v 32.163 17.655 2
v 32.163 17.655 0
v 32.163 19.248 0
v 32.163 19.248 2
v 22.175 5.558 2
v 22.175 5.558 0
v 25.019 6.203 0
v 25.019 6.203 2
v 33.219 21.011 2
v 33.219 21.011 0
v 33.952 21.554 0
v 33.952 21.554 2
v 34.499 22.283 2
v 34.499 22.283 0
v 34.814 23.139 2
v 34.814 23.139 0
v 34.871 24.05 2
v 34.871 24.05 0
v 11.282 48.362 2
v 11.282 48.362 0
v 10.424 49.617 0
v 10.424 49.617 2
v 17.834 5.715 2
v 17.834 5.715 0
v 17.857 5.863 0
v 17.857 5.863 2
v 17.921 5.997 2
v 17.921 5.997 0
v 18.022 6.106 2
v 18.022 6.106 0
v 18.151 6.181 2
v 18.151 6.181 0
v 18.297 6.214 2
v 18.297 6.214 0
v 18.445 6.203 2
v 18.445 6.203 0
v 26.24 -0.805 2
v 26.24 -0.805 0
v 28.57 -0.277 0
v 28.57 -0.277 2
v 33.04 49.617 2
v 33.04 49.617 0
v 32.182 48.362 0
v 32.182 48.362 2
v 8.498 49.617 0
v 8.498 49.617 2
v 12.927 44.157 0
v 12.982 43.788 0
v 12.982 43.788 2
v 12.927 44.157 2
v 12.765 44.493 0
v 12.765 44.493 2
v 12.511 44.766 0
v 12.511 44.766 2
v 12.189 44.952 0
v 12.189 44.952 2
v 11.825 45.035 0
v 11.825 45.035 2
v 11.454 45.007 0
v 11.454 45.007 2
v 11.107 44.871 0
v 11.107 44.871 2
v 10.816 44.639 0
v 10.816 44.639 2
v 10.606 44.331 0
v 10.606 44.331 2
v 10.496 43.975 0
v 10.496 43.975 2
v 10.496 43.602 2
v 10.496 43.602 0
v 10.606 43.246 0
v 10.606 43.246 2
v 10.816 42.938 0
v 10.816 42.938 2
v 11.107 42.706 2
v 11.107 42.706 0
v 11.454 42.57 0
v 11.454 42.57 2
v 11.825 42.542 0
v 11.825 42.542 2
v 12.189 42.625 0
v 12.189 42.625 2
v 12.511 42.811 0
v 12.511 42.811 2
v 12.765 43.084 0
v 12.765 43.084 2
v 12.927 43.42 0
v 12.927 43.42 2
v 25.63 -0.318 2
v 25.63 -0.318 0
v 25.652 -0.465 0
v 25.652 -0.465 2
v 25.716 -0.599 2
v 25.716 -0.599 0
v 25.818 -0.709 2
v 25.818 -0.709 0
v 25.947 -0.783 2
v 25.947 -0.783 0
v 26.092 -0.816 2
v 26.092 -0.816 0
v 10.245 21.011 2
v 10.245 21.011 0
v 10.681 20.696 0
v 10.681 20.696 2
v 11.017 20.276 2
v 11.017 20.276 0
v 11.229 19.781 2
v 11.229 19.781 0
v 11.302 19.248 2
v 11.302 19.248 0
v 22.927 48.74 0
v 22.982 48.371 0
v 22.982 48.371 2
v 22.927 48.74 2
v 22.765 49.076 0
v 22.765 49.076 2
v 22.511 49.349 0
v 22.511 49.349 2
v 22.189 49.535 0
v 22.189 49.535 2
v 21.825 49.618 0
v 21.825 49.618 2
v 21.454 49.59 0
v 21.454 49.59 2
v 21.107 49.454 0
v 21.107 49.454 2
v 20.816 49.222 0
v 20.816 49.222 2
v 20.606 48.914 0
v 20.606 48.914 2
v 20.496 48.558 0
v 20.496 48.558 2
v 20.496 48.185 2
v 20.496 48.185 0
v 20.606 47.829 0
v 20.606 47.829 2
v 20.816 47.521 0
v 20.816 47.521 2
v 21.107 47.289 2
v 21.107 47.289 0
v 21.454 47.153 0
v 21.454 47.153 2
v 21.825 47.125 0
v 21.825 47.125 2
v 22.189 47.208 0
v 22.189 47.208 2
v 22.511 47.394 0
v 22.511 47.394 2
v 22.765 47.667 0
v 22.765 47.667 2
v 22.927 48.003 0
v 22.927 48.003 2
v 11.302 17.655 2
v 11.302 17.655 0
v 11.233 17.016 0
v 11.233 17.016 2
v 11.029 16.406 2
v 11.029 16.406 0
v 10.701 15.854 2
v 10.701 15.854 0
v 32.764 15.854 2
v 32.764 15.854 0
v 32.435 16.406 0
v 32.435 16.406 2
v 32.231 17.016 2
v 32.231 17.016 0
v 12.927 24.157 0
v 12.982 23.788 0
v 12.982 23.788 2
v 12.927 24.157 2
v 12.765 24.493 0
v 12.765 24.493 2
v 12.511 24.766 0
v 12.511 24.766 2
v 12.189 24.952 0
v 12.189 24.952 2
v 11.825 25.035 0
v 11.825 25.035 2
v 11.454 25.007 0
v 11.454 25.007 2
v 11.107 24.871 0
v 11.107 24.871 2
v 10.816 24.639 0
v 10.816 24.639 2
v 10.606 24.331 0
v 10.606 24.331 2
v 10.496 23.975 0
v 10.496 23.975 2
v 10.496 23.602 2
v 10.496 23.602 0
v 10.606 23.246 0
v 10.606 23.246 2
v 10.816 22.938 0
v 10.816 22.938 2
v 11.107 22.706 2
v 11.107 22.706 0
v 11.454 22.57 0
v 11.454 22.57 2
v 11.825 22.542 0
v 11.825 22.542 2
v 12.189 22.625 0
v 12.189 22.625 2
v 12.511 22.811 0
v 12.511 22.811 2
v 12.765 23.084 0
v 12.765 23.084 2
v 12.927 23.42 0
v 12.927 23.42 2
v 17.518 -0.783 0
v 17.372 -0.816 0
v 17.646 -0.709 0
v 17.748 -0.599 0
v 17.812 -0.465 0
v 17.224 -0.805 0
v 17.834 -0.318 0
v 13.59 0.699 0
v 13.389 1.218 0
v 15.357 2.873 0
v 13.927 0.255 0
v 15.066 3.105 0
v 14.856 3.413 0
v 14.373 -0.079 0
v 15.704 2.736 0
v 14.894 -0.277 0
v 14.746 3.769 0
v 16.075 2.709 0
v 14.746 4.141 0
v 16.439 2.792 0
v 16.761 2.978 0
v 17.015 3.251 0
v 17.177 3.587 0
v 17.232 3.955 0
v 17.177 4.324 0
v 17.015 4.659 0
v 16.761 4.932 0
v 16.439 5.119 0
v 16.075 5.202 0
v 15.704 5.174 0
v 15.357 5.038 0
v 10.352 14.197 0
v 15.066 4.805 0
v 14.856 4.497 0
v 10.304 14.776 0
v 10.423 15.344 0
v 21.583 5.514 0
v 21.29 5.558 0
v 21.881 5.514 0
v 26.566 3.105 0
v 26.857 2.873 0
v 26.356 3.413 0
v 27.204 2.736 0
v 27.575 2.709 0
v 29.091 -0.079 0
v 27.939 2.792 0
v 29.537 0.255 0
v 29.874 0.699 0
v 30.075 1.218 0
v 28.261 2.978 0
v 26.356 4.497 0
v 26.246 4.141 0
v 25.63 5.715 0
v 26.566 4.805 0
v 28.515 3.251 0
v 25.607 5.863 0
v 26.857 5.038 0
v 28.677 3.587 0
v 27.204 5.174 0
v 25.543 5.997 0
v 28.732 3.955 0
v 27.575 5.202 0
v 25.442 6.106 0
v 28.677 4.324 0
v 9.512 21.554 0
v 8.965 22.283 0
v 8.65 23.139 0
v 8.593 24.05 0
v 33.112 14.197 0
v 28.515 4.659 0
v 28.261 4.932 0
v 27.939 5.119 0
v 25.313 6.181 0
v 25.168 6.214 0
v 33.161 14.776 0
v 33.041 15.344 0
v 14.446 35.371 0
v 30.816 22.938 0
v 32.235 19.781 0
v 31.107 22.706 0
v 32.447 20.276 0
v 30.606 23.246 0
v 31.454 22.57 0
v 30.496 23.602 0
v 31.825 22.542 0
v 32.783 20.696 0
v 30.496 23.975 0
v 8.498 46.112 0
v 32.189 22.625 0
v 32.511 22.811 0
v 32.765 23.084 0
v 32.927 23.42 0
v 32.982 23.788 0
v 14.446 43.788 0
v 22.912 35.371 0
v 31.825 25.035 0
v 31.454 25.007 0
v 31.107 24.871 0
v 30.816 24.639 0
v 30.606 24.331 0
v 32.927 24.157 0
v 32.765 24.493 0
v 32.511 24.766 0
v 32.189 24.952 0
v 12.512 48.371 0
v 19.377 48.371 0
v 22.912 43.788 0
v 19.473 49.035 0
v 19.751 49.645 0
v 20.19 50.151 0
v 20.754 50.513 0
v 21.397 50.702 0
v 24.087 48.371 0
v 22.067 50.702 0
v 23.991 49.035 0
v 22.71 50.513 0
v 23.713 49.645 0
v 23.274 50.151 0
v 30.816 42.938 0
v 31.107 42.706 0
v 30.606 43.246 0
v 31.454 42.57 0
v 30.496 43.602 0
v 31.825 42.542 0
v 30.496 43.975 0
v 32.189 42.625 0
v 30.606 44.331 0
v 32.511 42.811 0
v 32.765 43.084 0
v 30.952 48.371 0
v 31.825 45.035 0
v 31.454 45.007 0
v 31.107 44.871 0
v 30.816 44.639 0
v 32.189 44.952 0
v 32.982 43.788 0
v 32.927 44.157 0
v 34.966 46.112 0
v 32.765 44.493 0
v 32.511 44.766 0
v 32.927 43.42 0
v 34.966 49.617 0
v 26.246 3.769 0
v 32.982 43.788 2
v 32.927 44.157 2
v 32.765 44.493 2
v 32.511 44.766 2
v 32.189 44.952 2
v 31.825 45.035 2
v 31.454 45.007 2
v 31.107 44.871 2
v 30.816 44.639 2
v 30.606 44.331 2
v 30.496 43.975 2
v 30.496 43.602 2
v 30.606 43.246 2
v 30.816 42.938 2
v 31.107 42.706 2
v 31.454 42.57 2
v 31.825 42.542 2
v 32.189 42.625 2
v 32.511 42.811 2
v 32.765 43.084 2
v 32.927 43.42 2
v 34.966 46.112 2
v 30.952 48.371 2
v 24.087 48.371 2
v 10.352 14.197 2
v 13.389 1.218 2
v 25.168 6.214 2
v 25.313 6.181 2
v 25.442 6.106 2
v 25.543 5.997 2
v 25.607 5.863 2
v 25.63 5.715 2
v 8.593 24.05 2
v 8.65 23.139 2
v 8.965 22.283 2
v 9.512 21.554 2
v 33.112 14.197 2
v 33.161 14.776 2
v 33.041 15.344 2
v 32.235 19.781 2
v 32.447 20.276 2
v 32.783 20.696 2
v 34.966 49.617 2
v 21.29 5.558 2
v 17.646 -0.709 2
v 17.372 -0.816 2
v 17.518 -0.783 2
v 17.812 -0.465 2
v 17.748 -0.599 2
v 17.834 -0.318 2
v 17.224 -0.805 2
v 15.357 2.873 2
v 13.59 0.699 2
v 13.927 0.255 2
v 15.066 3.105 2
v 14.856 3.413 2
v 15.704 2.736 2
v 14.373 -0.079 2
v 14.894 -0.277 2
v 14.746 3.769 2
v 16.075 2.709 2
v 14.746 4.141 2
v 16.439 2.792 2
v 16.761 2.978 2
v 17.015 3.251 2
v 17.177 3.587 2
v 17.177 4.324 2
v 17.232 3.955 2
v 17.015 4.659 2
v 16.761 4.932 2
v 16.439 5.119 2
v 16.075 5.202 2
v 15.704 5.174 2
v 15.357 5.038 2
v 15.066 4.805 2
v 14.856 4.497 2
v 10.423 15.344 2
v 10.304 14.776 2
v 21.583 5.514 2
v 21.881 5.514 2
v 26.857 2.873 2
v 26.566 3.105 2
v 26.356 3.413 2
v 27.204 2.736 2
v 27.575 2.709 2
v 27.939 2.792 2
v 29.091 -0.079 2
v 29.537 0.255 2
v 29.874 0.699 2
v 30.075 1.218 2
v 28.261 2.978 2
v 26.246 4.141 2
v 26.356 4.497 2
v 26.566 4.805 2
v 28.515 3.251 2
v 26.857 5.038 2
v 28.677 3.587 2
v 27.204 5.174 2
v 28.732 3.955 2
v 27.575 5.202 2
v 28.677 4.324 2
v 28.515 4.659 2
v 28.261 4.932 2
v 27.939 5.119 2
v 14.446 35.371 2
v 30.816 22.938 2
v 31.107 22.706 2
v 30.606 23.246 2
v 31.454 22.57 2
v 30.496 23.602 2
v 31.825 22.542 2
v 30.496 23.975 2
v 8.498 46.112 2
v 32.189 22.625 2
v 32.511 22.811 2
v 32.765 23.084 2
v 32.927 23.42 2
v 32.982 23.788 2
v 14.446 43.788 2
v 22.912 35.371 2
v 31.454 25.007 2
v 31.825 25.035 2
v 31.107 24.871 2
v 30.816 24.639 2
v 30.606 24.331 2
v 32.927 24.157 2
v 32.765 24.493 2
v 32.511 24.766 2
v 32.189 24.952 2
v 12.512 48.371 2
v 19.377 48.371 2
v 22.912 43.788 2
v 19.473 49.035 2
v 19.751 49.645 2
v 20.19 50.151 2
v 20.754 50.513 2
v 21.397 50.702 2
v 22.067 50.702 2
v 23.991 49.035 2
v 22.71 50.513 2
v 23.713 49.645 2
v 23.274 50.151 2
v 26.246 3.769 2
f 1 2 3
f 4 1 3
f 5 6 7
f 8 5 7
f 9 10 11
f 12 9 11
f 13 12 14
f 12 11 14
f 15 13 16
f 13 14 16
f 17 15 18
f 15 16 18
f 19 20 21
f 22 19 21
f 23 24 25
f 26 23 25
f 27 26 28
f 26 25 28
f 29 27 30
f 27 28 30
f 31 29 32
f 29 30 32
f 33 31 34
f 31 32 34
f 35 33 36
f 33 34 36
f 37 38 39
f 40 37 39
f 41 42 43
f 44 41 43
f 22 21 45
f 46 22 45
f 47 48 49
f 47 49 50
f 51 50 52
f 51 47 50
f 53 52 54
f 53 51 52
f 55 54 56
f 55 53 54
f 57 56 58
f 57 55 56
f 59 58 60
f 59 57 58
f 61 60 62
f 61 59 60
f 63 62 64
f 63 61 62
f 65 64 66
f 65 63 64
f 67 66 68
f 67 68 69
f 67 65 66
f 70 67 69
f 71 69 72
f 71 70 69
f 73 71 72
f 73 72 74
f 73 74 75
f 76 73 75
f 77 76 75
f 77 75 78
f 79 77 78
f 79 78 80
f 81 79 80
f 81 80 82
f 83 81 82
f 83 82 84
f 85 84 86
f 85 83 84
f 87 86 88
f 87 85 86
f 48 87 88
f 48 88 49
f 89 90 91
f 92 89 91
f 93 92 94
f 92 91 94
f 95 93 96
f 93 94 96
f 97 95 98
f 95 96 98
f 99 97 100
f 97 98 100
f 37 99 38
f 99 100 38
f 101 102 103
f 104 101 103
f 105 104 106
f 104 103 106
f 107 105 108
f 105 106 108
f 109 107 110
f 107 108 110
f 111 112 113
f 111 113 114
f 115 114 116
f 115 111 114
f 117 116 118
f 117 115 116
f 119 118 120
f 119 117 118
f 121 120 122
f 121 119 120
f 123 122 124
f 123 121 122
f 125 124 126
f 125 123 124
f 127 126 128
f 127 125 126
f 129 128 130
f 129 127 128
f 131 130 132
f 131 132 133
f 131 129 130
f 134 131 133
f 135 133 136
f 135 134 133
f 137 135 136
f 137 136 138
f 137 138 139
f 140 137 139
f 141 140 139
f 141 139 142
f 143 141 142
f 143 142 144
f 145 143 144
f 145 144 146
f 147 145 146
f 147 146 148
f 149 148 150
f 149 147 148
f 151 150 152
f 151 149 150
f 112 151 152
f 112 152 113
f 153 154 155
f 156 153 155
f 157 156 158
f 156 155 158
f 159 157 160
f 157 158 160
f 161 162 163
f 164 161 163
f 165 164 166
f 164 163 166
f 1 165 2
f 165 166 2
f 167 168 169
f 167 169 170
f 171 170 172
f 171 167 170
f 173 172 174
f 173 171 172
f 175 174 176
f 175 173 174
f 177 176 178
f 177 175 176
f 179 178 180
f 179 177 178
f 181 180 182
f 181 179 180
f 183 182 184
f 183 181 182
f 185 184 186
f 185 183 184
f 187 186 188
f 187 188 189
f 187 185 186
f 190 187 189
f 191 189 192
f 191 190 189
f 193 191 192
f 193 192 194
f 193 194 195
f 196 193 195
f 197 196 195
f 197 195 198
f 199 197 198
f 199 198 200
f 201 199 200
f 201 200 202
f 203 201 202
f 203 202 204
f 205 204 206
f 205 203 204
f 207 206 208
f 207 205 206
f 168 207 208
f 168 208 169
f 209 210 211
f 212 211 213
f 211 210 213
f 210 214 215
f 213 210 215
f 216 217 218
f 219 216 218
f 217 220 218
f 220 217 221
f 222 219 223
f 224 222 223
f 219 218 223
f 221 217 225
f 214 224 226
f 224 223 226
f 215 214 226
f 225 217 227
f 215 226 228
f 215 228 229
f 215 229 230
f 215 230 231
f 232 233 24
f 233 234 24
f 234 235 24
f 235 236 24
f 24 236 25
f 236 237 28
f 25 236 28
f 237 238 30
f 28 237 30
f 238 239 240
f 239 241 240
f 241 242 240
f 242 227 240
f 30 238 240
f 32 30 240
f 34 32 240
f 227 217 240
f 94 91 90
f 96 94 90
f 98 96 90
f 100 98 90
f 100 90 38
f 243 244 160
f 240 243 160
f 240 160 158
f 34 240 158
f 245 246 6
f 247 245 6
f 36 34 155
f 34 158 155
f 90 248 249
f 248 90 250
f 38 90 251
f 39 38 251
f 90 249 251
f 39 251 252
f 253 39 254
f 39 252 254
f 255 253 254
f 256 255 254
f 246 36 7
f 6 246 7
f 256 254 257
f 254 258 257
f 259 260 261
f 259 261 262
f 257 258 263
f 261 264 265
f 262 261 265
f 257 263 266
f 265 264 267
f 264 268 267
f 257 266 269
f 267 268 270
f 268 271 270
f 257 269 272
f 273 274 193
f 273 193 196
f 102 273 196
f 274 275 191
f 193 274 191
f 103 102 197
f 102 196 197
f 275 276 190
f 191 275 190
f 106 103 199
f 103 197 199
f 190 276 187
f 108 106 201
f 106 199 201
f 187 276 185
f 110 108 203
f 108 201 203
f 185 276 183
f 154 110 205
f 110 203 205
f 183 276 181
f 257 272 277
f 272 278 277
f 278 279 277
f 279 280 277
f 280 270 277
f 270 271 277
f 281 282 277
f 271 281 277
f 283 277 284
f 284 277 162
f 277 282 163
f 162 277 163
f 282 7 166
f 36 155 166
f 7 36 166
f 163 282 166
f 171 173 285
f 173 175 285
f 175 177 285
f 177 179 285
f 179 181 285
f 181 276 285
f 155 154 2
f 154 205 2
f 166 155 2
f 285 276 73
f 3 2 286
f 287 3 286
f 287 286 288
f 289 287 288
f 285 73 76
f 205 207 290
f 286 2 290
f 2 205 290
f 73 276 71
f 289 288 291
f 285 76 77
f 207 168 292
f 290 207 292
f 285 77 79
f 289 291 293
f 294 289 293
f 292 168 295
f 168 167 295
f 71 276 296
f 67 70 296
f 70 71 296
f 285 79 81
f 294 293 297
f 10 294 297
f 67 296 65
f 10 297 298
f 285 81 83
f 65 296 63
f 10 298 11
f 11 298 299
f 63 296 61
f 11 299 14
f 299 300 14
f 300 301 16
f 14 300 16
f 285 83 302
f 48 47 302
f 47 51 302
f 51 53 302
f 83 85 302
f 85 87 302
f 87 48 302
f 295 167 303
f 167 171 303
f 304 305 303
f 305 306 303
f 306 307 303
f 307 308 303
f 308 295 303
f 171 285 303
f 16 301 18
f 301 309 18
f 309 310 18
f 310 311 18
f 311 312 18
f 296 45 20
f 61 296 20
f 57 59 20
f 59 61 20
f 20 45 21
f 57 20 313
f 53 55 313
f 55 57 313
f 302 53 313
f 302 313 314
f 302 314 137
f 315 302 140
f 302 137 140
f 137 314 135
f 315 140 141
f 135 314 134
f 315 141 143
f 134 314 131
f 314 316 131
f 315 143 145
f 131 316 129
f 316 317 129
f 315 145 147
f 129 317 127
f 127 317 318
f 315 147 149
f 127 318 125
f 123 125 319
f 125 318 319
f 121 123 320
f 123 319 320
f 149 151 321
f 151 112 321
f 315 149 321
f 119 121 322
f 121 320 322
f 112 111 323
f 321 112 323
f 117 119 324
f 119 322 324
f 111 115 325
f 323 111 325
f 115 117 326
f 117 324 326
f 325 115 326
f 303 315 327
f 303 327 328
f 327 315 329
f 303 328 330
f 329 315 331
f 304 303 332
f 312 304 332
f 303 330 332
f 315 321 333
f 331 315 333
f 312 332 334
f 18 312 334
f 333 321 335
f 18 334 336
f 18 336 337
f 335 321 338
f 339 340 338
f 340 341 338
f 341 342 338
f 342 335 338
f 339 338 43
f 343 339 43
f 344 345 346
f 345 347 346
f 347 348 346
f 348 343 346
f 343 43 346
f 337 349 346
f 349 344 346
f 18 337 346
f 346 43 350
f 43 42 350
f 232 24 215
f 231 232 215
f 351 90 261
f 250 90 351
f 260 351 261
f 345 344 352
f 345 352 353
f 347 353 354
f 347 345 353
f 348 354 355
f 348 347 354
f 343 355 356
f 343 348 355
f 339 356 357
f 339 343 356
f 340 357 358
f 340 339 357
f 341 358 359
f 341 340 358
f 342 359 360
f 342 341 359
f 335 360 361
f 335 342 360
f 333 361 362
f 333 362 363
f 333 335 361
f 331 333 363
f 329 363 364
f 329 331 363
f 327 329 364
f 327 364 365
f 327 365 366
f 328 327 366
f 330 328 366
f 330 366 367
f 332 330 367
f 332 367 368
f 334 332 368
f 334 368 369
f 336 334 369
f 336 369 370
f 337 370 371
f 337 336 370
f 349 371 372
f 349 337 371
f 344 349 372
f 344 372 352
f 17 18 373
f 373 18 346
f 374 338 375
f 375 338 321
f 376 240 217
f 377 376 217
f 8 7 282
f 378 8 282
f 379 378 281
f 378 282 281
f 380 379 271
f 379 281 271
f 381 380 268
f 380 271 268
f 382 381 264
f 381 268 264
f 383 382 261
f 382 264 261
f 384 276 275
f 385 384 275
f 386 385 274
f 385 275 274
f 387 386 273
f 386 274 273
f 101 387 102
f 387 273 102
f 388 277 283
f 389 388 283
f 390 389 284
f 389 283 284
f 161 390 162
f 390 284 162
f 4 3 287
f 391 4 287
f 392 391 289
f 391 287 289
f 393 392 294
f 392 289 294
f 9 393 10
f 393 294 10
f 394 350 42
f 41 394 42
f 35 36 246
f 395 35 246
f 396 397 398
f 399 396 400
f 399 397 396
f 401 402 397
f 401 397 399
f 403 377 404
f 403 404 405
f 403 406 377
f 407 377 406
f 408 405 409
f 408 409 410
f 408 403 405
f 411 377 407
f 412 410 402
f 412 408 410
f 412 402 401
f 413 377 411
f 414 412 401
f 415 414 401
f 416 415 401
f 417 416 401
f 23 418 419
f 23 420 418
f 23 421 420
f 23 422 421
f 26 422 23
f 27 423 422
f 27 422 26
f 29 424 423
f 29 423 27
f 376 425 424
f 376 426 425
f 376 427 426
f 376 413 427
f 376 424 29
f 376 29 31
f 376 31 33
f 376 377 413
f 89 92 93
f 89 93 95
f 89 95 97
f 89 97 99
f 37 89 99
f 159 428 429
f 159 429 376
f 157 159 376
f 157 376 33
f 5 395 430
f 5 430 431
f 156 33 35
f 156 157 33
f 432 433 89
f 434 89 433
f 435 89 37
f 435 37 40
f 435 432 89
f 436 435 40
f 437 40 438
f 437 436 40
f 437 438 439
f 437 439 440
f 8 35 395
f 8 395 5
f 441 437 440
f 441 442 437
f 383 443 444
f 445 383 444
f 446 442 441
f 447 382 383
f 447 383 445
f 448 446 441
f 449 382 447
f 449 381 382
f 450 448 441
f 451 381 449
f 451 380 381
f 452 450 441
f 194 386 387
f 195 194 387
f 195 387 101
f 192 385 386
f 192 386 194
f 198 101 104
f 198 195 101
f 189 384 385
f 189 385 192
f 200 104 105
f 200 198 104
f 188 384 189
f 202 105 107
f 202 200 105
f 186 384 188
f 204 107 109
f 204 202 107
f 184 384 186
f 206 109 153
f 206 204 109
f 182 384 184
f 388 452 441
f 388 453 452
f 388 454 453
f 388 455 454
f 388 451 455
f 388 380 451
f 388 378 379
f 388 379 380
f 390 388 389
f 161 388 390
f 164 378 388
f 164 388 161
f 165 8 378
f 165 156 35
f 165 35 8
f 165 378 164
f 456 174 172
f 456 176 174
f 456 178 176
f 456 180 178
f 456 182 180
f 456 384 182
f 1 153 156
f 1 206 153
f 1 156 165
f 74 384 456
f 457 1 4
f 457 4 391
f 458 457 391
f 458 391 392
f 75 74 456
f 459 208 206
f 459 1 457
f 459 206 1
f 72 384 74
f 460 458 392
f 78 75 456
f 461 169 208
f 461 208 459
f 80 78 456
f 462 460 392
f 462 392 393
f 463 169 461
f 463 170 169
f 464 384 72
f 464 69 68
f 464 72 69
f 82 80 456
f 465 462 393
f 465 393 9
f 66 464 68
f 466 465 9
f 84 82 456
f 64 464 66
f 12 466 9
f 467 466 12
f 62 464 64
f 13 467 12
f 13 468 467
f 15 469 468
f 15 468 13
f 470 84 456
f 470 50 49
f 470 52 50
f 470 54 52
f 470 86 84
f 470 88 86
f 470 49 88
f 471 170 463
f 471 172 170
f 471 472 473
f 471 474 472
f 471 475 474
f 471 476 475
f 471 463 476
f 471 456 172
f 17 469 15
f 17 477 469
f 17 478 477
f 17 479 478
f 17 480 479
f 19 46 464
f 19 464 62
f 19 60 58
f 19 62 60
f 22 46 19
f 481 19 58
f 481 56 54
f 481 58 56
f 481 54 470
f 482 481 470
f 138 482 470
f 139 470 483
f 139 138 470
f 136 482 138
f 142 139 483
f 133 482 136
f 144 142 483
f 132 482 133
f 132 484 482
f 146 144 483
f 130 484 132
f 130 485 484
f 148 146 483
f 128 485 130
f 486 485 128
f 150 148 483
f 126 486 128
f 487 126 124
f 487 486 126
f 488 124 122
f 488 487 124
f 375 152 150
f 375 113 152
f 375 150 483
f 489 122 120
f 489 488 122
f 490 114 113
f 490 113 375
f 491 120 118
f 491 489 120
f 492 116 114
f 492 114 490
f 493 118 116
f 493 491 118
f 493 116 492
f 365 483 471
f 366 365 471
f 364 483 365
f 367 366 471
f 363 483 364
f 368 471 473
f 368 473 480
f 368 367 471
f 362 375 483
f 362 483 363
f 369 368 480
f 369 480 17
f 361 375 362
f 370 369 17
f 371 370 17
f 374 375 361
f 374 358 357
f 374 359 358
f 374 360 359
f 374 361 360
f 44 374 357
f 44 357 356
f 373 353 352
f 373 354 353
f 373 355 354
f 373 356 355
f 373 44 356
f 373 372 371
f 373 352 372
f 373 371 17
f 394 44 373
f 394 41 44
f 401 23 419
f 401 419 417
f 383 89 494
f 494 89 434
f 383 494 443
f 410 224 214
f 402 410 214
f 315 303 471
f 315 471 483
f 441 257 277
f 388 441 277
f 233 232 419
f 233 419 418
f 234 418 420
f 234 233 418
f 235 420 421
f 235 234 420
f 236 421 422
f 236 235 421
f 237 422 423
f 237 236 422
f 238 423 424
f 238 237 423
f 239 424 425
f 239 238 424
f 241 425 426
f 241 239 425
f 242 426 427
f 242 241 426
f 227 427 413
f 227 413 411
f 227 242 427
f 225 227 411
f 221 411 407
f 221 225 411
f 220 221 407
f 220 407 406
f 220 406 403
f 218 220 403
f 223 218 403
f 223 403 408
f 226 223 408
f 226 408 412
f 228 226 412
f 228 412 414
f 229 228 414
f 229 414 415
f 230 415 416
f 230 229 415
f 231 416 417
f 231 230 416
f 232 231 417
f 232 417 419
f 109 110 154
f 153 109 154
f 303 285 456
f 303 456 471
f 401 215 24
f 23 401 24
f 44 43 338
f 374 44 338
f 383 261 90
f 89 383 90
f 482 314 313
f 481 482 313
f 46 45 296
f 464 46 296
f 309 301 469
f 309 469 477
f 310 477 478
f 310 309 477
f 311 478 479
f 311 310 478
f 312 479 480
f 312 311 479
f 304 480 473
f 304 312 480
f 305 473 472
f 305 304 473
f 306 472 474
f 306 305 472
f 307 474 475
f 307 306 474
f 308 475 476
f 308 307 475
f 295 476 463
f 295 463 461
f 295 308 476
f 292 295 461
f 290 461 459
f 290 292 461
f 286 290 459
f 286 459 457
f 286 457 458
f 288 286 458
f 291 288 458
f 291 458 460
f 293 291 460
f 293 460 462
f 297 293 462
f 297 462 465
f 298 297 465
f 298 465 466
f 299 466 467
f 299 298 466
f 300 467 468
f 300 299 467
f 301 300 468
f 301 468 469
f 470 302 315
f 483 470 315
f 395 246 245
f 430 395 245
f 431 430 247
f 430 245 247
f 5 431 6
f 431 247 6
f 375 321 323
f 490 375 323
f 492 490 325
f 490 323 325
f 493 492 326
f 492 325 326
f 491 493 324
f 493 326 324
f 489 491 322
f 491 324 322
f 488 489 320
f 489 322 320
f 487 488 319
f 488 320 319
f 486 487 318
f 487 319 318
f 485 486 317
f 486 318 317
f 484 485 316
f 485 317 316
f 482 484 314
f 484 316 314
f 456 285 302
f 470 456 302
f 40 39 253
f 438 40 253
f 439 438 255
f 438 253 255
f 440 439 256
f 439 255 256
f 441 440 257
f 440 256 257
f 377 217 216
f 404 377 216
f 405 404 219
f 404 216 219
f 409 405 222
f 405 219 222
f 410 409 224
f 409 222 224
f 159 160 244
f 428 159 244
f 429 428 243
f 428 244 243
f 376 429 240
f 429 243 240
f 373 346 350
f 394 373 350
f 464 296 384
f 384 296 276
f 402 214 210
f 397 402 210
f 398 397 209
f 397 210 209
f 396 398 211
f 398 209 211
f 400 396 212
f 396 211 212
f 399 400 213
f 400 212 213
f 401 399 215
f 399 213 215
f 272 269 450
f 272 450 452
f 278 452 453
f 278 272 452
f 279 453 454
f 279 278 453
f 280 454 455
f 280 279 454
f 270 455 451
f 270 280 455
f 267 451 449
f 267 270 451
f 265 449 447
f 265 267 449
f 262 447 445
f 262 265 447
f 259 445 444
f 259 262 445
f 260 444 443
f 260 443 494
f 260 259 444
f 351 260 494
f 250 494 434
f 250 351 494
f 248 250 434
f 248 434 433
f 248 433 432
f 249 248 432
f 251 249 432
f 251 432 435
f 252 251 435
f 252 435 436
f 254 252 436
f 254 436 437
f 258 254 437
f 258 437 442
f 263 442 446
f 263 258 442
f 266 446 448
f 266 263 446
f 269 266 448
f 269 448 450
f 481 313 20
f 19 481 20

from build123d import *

# Parameters (mm, degrees)
F0_R     = 1.25
F0_W     = 8.466002
F0_H     = 8.417533
F1_DEPTH = 2


with BuildPart() as f1:
    # F0 (on Top) → F1 (new body)
    with BuildSketch(Plane.XY):
        with BuildLine():
            Line((19.377316, 48.371452), (12.511831, 48.371452))
            Line((12.511831, 48.371452), (11.281675, 48.362336))
            Line((11.281675, 48.362336), (10.424009, 49.616981))
            Line((10.424009, 49.616981), (8.498245, 49.616981))
            Line((8.498245, 49.616981), (8.498245, 46.11221))
            Line((8.498245, 46.11221), (8.592918, 24.0495))
            ThreePointArc((8.592918, 24.0495), (8.964934, 22.283302), (10.245487, 21.011281))
            ThreePointArc((10.245487, 21.011281), (11.017389, 20.275696), (11.301618, 19.248014))
            Line((11.301618, 19.248014), (11.301618, 17.655057))
            ThreePointArc((11.301618, 17.655057), (11.147379, 16.705509), (10.700523, 15.853599))
            ThreePointArc((10.700523, 15.853599), (10.34255, 15.063964), (10.352377, 14.197032))
            Line((10.352377, 14.197032), (13.388781, 1.218066))
            ThreePointArc((13.388781, 1.218066), (13.926743, 0.254704), (14.893698, -0.276774))
            Line((14.893698, -0.276774), (17.223874, -0.805427))
            ThreePointArc((17.223874, -0.805427), (17.646499, -0.708531), (17.834499, -0.317819))
            Line((17.834499, -0.317819), (17.834499, 5.715386))
            ThreePointArc((17.834499, 5.715386), (18.0225, 6.106098), (18.445124, 6.202995))
            Line((18.445124, 6.202995), (21.28958, 5.557665))
            ThreePointArc((21.28958, 5.557665), (21.732081, 5.5081), (22.174581, 5.557665))
            Line((22.174581, 5.557665), (25.019037, 6.202995))
            ThreePointArc((25.019037, 6.202995), (25.441662, 6.106098), (25.629662, 5.715386))
            Line((25.629662, 5.715386), (25.629662, -0.317819))
            ThreePointArc((25.629662, -0.317819), (25.817662, -0.708531), (26.240287, -0.805427))
            Line((26.240287, -0.805427), (28.570463, -0.276774))
            ThreePointArc((28.570463, -0.276774), (29.537418, 0.254704), (30.07538, 1.218066))
            Line((30.07538, 1.218066), (33.111785, 14.197032))
            ThreePointArc((33.111785, 14.197032), (33.121611, 15.063964), (32.763638, 15.853599))
            ThreePointArc((32.763638, 15.853599), (32.316782, 16.705509), (32.162543, 17.655057))
            Line((32.162543, 17.655057), (32.162543, 19.248014))
            ThreePointArc((32.162543, 19.248014), (32.446773, 20.275696), (33.218674, 21.011281))
            ThreePointArc((33.218674, 21.011281), (34.499227, 22.283302), (34.871243, 24.0495))
            Line((34.871243, 24.0495), (34.965916, 46.11221))
            Line((34.965916, 46.11221), (34.965916, 49.616981))
            Line((34.965916, 49.616981), (33.040153, 49.616981))
            Line((33.040153, 49.616981), (32.182486, 48.362336))
            Line((32.182486, 48.362336), (30.95233, 48.371452))
            Line((30.95233, 48.371452), (24.086845, 48.371452))
            ThreePointArc((24.086845, 48.371452), (21.732081, 50.726217), (19.377316, 48.371452))
        make_face()
        with Locations((15.982081, 3.955105)):
            Circle(F0_R, mode=Mode.SUBTRACT)
        with Locations((11.732081, 23.788427)):
            Circle(F0_R, mode=Mode.SUBTRACT)
        with Locations((27.482081, 3.955105)):
            Circle(F0_R, mode=Mode.SUBTRACT)
        with Locations((31.732081, 23.788427)):
            Circle(F0_R, mode=Mode.SUBTRACT)
        with Locations((11.732081, 43.788427)):
            Circle(F0_R, mode=Mode.SUBTRACT)
        with Locations((18.679423, 39.579661)):
            Rectangle(F0_W, F0_H, mode=Mode.SUBTRACT)
        with Locations((21.732081, 48.371452)):
            Circle(F0_R, mode=Mode.SUBTRACT)
        with Locations((31.732081, 43.788427)):
            Circle(F0_R, mode=Mode.SUBTRACT)
    extrude(amount=F1_DEPTH)


solid = f1.part
